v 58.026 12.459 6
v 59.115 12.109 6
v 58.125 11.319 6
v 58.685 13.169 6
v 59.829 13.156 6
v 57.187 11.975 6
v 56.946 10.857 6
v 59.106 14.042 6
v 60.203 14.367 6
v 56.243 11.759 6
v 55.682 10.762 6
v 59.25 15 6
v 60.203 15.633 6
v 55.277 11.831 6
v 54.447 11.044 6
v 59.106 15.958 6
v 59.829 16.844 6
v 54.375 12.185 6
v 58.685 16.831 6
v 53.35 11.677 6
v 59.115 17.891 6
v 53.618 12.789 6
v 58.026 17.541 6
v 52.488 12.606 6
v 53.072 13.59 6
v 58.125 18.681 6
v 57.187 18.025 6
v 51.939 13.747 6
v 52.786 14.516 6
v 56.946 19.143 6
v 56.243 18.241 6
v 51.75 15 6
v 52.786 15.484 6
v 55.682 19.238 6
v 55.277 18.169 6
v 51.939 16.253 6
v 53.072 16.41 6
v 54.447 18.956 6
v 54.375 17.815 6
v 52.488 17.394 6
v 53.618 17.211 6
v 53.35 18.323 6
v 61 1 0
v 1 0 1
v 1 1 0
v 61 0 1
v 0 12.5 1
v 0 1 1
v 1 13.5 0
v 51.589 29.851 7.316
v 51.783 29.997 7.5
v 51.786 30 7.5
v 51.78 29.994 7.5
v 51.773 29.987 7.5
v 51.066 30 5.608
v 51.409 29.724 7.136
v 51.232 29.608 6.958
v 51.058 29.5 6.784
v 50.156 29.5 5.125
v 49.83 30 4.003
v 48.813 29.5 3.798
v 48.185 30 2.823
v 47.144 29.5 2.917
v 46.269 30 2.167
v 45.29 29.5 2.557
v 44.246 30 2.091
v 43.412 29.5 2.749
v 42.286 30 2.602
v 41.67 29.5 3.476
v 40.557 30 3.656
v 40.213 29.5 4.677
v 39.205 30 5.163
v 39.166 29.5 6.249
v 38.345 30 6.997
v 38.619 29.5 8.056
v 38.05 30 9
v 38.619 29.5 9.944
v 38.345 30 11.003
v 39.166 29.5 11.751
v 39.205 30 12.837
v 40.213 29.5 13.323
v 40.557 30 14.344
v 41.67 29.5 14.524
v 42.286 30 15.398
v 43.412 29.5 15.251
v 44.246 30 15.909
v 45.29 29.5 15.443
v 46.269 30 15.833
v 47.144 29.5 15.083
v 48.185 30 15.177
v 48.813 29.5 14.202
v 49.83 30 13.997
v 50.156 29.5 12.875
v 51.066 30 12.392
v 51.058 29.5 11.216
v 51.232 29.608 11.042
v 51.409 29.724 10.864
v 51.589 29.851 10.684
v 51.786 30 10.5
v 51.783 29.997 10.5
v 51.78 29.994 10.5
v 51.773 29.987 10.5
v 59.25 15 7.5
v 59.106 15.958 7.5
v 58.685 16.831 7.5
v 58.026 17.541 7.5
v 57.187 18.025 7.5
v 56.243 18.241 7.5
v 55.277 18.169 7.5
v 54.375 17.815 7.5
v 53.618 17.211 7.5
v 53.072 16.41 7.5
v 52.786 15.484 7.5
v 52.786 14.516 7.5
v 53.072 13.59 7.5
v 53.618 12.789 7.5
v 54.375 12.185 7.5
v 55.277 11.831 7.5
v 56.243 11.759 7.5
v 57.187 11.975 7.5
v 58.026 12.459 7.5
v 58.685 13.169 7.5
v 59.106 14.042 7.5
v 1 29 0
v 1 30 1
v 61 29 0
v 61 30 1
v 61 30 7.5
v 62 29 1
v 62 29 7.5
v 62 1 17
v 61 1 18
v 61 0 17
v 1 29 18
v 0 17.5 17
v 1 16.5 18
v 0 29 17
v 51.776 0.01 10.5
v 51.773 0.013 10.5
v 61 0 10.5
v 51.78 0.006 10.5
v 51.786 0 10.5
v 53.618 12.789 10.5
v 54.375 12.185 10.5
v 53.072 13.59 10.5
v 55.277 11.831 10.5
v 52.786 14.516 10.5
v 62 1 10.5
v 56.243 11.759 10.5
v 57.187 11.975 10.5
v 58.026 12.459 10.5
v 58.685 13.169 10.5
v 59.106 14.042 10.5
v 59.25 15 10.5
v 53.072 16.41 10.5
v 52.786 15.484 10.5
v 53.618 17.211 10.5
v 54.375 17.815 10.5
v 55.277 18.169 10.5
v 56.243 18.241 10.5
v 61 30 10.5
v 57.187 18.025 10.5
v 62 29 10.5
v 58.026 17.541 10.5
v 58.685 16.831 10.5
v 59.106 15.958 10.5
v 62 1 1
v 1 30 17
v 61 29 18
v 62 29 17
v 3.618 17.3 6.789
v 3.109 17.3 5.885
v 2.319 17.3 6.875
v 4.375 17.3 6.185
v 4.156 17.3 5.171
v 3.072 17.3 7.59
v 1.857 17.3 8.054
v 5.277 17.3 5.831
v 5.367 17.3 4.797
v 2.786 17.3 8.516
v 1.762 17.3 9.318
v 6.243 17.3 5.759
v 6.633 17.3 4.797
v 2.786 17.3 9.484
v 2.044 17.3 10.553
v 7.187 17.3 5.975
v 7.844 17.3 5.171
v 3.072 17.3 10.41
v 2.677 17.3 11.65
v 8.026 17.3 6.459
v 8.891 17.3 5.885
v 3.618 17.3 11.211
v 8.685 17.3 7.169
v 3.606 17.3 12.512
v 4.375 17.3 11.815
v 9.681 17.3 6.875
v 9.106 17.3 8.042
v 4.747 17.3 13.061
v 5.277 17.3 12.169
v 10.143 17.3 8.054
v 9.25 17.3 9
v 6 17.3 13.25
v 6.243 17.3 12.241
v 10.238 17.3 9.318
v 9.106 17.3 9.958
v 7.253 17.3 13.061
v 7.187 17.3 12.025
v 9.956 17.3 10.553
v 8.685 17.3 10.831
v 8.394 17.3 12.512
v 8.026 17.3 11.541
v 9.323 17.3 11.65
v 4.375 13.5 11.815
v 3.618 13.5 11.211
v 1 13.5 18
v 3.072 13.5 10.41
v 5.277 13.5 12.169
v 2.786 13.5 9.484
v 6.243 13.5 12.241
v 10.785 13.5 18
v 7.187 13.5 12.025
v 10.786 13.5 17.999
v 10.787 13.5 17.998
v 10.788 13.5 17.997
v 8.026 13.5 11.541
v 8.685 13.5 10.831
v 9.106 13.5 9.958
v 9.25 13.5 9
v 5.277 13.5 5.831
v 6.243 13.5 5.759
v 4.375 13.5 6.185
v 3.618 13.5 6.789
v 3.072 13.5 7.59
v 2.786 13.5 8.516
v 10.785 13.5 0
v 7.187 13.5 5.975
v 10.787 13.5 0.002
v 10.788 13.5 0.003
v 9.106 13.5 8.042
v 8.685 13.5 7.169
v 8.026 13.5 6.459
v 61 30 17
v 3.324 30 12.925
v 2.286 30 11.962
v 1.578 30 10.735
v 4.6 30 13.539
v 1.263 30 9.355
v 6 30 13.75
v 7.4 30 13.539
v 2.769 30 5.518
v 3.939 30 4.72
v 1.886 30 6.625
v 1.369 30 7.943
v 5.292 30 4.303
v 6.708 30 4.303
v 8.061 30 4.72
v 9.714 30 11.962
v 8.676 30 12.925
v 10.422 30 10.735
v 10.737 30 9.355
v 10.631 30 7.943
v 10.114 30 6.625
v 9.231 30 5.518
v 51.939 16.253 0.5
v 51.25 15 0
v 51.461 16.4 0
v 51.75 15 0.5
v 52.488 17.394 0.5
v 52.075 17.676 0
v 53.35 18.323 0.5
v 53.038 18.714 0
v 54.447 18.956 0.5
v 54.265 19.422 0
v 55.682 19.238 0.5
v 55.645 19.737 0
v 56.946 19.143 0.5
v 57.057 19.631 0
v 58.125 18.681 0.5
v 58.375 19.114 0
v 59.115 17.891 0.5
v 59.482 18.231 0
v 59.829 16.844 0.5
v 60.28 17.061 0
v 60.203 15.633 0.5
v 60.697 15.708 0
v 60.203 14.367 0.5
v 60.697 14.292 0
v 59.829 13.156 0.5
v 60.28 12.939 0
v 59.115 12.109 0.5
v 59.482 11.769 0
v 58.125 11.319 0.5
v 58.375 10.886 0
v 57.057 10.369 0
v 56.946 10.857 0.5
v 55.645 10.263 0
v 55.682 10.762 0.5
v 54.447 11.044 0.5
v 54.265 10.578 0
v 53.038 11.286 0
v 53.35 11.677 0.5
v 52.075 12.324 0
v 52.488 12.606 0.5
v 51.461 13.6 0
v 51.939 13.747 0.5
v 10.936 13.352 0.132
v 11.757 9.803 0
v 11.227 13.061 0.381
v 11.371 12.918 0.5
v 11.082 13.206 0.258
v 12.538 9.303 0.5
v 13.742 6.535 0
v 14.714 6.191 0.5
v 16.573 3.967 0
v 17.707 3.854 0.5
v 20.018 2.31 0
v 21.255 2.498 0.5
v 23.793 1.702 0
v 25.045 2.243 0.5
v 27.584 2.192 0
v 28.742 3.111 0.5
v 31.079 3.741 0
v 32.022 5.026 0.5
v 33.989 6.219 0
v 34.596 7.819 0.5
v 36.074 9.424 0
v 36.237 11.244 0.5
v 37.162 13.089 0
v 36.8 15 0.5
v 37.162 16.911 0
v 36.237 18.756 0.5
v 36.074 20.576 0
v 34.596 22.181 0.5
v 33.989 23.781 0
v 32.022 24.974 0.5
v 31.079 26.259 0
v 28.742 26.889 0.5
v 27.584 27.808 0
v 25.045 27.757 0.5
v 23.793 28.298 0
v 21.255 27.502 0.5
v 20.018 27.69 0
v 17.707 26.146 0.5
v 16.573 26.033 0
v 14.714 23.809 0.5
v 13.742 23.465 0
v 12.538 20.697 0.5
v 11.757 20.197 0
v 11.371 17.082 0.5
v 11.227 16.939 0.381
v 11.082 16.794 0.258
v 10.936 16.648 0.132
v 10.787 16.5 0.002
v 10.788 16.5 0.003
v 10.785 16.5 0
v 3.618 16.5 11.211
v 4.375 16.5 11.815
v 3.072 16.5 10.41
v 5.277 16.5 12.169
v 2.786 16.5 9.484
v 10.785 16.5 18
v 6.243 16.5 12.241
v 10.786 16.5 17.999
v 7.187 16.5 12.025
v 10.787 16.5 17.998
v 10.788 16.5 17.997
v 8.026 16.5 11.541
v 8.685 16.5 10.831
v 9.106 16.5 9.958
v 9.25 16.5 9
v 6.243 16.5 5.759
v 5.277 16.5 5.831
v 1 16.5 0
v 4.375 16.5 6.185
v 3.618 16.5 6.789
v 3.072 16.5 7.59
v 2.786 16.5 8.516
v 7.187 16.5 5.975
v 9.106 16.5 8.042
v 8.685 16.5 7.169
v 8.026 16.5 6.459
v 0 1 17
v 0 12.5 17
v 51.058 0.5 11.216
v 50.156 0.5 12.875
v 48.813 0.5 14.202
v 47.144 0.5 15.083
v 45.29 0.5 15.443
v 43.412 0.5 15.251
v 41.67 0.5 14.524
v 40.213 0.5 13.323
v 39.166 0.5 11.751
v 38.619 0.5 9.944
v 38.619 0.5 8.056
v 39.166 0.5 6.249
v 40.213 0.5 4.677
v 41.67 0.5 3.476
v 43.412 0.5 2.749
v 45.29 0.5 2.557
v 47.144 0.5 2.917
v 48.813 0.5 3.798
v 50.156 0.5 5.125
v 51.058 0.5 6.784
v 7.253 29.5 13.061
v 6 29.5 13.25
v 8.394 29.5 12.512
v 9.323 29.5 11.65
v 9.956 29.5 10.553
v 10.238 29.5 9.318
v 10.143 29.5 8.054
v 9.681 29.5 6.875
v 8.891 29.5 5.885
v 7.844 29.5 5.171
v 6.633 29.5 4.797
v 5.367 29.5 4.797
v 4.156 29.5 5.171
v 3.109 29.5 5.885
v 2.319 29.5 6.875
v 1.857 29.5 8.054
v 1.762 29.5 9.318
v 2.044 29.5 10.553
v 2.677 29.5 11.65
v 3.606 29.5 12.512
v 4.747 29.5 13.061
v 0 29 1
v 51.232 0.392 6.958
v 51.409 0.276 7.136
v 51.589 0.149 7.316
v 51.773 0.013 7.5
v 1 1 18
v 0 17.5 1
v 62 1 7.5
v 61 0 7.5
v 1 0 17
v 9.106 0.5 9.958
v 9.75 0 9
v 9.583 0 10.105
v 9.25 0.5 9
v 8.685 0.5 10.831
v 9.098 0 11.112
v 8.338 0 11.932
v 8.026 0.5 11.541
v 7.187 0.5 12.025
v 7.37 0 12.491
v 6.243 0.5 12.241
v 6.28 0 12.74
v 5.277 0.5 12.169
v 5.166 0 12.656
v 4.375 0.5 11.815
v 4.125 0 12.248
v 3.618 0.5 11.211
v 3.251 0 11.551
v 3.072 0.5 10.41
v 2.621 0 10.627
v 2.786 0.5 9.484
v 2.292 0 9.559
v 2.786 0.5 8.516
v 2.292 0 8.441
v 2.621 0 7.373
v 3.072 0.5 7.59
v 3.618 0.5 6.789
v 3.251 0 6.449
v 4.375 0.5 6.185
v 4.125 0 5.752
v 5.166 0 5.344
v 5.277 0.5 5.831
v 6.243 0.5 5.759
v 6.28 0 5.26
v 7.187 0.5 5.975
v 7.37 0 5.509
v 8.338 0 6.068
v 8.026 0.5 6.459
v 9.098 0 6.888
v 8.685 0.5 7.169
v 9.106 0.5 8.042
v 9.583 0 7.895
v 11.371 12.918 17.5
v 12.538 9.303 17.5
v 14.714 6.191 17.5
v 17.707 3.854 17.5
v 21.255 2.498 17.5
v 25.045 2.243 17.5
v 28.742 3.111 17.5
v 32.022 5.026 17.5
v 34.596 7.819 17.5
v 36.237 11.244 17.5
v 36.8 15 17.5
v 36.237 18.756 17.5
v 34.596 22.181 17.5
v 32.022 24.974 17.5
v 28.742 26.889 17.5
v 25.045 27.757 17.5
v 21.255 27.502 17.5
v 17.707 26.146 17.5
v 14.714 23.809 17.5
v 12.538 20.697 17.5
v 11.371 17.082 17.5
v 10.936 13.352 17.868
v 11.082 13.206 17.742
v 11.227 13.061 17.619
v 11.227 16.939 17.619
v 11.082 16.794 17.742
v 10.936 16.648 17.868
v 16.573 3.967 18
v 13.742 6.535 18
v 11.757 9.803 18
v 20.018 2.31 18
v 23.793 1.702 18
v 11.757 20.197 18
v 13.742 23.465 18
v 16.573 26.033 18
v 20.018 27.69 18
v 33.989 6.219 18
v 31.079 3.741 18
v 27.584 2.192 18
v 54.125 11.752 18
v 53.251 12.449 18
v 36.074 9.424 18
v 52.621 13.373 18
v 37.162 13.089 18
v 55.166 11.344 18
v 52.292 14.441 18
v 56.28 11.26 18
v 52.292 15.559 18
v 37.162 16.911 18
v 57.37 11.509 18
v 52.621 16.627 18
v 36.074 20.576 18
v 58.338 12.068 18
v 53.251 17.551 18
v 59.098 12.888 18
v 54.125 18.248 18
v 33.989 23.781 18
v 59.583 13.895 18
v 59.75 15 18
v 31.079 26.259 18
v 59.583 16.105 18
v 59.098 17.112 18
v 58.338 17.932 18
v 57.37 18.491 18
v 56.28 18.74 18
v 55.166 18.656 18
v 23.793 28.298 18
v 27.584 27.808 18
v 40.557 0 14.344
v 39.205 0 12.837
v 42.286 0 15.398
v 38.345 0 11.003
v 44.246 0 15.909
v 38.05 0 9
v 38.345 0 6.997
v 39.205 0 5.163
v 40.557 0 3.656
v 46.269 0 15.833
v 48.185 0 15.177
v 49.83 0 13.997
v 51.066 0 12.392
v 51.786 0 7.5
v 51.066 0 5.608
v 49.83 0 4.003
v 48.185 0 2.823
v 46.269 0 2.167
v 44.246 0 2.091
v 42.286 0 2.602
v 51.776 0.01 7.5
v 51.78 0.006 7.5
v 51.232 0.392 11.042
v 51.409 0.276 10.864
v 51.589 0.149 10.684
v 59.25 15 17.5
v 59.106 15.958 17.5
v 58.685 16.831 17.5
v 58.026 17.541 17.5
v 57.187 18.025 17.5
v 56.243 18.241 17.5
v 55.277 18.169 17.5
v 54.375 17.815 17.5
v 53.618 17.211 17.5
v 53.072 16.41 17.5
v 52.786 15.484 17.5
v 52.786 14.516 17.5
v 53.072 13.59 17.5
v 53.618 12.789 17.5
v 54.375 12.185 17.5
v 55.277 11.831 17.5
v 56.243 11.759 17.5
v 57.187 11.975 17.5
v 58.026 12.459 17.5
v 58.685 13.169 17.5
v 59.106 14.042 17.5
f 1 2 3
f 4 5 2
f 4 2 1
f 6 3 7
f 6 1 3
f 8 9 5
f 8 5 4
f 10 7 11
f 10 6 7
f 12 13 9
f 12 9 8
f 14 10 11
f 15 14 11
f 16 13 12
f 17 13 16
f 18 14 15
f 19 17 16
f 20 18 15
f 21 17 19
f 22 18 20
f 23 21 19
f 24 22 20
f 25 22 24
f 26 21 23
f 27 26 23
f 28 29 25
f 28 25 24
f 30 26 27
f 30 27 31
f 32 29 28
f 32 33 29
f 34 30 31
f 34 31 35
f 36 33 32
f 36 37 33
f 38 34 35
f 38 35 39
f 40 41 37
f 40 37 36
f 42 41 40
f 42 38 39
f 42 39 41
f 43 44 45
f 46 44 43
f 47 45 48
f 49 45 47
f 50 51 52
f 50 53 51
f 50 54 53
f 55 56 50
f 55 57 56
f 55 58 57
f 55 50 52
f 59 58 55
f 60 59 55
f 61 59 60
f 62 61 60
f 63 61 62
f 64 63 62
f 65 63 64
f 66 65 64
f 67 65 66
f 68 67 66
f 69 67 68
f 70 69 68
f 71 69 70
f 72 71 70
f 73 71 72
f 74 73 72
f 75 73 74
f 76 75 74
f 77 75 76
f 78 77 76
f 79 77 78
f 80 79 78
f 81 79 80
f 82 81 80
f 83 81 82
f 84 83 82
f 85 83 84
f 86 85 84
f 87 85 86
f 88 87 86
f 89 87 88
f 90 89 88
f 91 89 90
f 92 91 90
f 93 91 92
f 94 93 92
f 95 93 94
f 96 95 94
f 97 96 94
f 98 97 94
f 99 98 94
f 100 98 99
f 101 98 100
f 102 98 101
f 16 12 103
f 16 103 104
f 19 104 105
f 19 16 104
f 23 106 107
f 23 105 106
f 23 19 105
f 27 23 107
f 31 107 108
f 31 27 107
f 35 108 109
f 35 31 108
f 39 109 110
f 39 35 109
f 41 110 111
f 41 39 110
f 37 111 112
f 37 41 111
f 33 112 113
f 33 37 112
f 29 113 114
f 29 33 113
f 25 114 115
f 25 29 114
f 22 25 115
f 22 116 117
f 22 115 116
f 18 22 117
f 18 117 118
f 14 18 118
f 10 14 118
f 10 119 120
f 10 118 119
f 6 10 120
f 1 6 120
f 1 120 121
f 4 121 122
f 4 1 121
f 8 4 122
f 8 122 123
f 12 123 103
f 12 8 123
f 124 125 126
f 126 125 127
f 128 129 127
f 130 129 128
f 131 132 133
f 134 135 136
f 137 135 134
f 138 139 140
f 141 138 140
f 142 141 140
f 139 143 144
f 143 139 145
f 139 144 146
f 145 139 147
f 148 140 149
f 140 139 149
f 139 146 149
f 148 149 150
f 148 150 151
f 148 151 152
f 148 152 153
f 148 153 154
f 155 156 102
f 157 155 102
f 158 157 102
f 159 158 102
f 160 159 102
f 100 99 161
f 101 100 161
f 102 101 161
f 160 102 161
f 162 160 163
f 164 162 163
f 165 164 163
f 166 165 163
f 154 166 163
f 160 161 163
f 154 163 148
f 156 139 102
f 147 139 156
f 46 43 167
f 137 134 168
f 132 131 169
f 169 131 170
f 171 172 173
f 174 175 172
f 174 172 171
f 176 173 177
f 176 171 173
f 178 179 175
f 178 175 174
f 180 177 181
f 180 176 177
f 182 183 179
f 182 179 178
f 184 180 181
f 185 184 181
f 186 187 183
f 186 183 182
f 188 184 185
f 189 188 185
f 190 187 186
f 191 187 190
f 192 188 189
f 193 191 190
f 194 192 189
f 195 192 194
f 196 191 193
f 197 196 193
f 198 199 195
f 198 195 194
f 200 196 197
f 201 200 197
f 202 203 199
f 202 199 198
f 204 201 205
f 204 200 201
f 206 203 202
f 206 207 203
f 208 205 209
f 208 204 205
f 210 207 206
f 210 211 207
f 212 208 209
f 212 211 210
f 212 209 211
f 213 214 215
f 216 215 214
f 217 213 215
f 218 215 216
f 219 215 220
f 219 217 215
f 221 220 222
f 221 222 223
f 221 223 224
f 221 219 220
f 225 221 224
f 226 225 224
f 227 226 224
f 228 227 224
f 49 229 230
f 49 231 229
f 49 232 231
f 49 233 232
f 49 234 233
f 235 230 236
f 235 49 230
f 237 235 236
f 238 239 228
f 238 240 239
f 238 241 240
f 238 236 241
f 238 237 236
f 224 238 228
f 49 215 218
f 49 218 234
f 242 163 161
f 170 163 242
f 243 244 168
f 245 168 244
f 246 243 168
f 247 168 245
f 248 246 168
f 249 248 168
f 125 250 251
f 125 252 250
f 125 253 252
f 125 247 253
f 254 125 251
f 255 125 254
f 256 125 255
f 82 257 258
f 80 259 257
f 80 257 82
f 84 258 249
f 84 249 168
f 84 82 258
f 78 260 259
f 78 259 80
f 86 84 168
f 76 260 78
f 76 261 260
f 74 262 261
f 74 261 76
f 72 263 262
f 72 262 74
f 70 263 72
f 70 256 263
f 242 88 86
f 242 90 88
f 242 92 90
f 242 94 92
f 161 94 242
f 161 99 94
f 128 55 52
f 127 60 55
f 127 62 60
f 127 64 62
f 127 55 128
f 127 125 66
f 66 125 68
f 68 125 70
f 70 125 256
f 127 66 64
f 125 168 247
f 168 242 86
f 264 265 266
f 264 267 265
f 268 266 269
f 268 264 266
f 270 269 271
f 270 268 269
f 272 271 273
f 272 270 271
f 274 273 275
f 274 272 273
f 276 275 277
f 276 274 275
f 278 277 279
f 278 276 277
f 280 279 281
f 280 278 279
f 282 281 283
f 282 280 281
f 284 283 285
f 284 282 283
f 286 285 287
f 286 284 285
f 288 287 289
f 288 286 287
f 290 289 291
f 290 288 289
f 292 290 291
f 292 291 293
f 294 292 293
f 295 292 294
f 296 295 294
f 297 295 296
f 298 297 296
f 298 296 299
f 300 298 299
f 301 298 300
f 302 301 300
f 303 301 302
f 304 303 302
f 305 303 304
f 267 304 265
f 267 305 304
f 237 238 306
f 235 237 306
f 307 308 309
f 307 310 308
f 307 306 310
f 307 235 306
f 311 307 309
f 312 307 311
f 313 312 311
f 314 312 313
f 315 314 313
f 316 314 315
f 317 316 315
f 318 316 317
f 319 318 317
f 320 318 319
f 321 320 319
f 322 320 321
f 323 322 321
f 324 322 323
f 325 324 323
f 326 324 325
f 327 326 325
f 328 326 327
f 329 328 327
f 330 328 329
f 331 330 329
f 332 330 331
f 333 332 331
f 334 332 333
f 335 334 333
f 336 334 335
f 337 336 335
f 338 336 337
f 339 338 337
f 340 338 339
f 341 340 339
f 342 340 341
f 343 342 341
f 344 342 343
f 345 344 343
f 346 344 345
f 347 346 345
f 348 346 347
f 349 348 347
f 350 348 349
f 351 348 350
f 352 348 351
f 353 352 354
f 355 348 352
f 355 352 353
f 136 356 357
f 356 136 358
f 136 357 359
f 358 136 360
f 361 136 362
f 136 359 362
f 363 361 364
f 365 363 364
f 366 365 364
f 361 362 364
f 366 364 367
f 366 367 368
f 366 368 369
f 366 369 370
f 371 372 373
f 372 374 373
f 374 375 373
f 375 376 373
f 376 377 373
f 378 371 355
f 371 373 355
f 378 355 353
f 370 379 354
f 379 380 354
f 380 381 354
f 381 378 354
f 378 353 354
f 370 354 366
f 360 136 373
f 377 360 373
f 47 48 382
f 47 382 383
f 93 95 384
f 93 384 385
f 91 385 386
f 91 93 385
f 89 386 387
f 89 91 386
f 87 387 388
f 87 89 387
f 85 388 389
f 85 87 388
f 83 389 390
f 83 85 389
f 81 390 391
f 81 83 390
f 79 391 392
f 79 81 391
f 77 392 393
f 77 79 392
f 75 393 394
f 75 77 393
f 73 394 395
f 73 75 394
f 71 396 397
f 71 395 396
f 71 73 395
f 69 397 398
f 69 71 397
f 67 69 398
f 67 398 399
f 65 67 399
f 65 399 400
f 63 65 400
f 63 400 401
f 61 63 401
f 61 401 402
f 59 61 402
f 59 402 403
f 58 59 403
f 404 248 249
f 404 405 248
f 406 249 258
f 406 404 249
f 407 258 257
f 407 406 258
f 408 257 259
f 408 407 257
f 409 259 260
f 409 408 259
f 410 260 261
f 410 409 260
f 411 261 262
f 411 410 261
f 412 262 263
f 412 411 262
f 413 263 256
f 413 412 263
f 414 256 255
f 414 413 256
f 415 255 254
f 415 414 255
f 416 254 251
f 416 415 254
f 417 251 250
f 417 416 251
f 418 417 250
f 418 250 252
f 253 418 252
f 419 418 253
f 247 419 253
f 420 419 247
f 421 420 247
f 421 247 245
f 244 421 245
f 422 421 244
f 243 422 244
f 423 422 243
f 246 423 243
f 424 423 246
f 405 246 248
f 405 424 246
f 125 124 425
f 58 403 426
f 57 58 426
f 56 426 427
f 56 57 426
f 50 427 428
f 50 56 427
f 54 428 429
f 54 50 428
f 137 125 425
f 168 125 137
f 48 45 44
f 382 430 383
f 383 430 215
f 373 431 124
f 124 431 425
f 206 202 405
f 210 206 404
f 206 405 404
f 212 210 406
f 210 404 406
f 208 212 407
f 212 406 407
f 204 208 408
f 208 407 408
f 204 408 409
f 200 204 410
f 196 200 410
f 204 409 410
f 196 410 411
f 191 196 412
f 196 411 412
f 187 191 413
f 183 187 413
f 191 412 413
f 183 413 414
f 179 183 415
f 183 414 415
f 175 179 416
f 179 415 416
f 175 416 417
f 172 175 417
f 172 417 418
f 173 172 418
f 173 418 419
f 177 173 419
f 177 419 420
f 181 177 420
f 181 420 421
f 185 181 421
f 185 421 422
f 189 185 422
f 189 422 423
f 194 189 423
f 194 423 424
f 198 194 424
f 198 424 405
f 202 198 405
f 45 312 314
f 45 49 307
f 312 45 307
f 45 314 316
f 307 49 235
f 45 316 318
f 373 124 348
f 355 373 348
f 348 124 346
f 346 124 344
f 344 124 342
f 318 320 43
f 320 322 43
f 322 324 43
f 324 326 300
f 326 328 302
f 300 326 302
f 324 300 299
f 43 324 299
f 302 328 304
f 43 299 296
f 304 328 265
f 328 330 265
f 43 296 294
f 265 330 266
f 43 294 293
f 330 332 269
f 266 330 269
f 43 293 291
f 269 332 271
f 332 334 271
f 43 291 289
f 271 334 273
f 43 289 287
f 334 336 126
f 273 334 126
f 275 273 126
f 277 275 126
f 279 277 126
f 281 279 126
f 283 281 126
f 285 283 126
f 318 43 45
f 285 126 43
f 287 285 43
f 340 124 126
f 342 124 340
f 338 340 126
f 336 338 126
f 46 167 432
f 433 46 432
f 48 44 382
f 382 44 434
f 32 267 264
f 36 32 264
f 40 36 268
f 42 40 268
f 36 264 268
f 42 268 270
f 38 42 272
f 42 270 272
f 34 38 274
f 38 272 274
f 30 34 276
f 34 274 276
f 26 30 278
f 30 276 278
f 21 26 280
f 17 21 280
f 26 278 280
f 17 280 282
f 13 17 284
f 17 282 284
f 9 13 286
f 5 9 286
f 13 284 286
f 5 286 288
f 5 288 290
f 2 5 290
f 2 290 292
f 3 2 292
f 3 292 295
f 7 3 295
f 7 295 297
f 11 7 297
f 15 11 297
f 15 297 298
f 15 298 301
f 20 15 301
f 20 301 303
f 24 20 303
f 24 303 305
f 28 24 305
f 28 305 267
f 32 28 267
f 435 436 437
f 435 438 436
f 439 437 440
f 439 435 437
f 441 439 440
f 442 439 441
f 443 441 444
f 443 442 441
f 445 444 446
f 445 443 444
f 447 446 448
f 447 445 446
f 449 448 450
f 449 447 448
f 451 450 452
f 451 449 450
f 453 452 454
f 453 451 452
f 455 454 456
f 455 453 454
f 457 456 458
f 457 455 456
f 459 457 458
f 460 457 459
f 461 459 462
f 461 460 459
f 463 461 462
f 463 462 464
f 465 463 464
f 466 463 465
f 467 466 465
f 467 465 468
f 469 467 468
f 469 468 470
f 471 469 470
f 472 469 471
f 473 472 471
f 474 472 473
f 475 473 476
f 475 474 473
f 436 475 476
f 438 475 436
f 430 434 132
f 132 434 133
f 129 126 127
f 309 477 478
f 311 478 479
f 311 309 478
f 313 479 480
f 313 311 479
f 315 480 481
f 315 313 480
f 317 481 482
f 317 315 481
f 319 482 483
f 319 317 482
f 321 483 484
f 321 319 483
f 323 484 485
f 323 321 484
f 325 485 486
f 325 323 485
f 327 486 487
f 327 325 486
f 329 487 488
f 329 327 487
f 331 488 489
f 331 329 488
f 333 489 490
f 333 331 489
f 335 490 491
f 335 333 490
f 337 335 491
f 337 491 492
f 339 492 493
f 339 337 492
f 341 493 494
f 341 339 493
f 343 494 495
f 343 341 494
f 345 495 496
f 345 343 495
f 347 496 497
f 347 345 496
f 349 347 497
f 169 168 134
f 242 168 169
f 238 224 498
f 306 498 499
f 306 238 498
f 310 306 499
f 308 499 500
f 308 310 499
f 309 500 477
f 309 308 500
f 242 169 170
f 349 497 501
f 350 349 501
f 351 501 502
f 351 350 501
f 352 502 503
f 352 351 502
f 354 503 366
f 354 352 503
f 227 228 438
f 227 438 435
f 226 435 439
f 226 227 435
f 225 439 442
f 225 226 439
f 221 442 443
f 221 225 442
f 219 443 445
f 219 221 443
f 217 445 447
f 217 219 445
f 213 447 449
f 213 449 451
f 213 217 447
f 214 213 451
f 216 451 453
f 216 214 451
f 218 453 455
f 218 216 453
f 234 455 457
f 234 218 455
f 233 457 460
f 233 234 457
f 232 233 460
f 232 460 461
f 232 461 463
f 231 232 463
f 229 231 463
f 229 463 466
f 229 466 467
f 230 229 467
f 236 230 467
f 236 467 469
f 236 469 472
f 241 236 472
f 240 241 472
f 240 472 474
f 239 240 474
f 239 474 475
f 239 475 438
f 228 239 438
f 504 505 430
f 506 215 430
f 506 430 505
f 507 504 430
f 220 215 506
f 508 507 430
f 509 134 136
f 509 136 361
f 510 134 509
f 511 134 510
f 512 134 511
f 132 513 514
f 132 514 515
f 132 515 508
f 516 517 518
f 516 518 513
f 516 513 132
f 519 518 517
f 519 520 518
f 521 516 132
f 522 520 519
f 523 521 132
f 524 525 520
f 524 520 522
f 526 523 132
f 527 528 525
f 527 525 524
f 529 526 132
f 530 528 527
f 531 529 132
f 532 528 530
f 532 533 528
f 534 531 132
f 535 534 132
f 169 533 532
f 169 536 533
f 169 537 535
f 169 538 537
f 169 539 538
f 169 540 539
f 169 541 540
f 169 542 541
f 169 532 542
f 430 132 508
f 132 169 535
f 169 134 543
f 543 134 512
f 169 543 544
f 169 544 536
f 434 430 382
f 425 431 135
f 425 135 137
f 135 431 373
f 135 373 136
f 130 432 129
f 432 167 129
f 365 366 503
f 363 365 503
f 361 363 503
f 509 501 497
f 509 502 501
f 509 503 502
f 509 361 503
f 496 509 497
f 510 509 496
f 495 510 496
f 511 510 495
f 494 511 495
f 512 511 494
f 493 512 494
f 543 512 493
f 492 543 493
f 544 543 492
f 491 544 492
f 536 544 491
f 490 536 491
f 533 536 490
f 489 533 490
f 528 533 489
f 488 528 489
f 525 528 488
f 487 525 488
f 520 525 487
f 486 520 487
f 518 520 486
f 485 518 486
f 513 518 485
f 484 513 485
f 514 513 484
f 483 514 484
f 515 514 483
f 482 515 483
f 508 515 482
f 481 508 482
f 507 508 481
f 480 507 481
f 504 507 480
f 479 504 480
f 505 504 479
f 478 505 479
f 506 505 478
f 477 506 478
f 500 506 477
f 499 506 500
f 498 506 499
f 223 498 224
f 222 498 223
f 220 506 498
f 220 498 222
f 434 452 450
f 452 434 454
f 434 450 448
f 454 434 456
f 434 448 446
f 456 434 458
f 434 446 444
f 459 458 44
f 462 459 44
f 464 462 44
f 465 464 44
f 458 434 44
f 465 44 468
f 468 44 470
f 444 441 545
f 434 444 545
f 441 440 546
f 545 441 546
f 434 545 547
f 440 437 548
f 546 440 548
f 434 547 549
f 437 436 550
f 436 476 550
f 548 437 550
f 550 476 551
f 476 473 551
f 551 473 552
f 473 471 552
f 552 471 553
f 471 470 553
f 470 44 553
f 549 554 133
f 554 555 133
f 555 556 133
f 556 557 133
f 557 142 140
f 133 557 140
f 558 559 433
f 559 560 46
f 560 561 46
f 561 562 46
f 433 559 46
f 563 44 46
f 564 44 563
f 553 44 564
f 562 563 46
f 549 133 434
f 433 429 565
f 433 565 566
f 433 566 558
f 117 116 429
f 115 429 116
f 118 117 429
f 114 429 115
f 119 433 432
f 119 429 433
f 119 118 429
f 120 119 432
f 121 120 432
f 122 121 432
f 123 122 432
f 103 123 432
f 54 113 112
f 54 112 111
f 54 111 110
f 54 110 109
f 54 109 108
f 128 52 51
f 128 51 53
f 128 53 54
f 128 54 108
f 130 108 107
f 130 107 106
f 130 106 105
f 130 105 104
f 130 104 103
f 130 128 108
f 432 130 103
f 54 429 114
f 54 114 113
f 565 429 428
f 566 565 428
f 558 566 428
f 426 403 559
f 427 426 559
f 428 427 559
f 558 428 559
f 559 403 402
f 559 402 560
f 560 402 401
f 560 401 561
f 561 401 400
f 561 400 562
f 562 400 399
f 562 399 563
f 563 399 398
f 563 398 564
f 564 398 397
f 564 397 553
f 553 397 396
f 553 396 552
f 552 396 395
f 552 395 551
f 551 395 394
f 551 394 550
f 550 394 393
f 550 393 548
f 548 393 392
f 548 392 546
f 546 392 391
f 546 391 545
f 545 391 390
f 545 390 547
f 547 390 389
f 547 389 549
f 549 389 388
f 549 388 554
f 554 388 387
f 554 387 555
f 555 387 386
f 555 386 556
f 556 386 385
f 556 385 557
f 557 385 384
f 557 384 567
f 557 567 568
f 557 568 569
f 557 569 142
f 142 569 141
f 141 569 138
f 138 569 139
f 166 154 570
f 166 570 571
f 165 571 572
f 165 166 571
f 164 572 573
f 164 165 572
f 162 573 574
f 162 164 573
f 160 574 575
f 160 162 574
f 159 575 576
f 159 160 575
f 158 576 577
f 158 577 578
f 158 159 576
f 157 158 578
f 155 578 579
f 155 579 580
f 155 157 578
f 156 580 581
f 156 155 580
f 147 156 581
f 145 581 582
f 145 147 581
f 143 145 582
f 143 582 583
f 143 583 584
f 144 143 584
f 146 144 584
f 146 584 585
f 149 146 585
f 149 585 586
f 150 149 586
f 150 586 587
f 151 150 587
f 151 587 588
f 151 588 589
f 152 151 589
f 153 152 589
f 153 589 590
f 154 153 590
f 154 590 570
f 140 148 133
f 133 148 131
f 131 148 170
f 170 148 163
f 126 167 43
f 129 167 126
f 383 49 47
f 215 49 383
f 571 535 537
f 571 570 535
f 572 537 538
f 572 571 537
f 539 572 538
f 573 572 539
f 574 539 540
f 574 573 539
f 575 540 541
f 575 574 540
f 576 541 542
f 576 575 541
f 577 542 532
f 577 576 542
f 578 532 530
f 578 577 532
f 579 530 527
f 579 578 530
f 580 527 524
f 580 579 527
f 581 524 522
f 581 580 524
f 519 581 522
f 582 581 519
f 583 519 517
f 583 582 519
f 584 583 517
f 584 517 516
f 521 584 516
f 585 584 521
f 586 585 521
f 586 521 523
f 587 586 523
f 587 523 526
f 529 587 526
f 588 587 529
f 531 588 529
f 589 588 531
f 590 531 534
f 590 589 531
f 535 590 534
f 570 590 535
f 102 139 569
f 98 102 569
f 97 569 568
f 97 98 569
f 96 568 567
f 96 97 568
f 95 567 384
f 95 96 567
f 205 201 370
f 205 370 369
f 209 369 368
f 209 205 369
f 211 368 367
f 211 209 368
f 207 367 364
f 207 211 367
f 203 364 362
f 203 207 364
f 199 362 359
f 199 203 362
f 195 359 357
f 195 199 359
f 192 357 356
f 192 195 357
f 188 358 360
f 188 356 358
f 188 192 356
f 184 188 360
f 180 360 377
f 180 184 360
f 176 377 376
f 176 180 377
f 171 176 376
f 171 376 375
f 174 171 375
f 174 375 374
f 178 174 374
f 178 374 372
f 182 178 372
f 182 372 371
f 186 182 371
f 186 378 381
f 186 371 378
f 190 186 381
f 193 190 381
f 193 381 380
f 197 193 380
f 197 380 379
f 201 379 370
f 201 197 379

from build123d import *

# Parameters (mm, degrees)
ESQUISSE1_W                  = 62
ESQUISSE1_H                  = 30
BOSS_EXTRU_1_DEPTH           = 18
ENL_V_MAT_EXTRU_1_DEPTH      = 72.189886922
ENL_V_MAT_EXTRU_1_DEPTH_BACK = 72.189886922
ESQUISSE2_R                  = 12.8
ENL_V_MAT_EXTRU_2_DEPTH      = 72.189886922
ENL_V_MAT_EXTRU_2_DEPTH_BACK = 72.189886922
ESQUISSE3_W                  = 15
ESQUISSE3_H                  = 3
ENL_V_MAT_EXTRU_3_DEPTH      = 72.189886922
ENL_V_MAT_EXTRU_3_DEPTH_BACK = 72.189886922
ESQUISSE4_R                  = 6.45
ESQUISSE4_R_2                = 3.25
ENL_V_MAT_EXTRU_4_DEPTH      = 72.189886922
ENL_V_MAT_EXTRU_4_DEPTH_BACK = 72.189886922
ESQUISSE6_W                  = 15
ESQUISSE6_H                  = 3
ENL_V_MAT_EXTRU_5_DEPTH      = 72.189886922
ENL_V_MAT_EXTRU_5_DEPTH_BACK = 72.189886922
ESQUISSE8_R                  = 3.25
ESQUISSE9_R                  = 4.25
ENL_V_MAT_EXTRU_6_DEPTH      = 12.7
ESQUISSE10_R                 = 4.25
ENL_V_MAT_EXTRU_7_DEPTH      = 6
CHANFREIN1_SIZE              = 0.5
CHANFREIN2_SIZE              = 1


with BuildPart() as part:
    # Esquisse1 → Boss.-Extru.1 (new body)
    with BuildSketch(Plane.XY):
        with Locations((31, 15)):
            Rectangle(ESQUISSE1_W, ESQUISSE1_H)
    extrude(amount=BOSS_EXTRU_1_DEPTH)

    # Esquisse2 → Enlèv. mat.-Extru.1 (cut, two sides: drawn at the far end of the back side and taken through both)
    with BuildSketch(Plane.XY.offset(18).offset(-ENL_V_MAT_EXTRU_1_DEPTH_BACK)):
        with Locations((24, 15)):
            Circle(ESQUISSE2_R)
    extrude(amount=ENL_V_MAT_EXTRU_1_DEPTH + ENL_V_MAT_EXTRU_1_DEPTH_BACK, mode=Mode.SUBTRACT)

    # Esquisse3 → Enlèv. mat.-Extru.2 (cut, two sides: drawn at the far end of the back side and taken through both)
    with BuildSketch(Plane.XY.offset(18).offset(-ENL_V_MAT_EXTRU_2_DEPTH_BACK)):
        with Locations((7.5, 15)):
            Rectangle(ESQUISSE3_W, ESQUISSE3_H)
    extrude(amount=ENL_V_MAT_EXTRU_2_DEPTH + ENL_V_MAT_EXTRU_2_DEPTH_BACK, mode=Mode.SUBTRACT)

    # Esquisse4 → Enlèv. mat.-Extru.3 (cut, two sides: drawn at the far end of the back side and taken through both)
    with BuildSketch(Plane.XZ.offset(-ENL_V_MAT_EXTRU_3_DEPTH_BACK)):
        with Locations(Location((45, 9, 0), (0, 0, 270))):
            Circle(ESQUISSE4_R)
        with Locations((6, 9)):
            Circle(ESQUISSE4_R_2)
    extrude(amount=ENL_V_MAT_EXTRU_3_DEPTH + ENL_V_MAT_EXTRU_3_DEPTH_BACK, mode=Mode.SUBTRACT)

    # Esquisse6 → Enlèv. mat.-Extru.4 (cut, two sides: drawn at the far end of the back side and taken through both)
    with BuildSketch(Plane.XZ.offset(-ENL_V_MAT_EXTRU_4_DEPTH_BACK)):
        with Locations((54.5, 9)):
            Rectangle(ESQUISSE6_W, ESQUISSE6_H)
    extrude(amount=ENL_V_MAT_EXTRU_4_DEPTH + ENL_V_MAT_EXTRU_4_DEPTH_BACK, mode=Mode.SUBTRACT)

    # Esquisse8 → Enlèv. mat.-Extru.5 (cut, two sides: drawn at the far end of the back side and taken through both)
    with BuildSketch(Plane.XY.offset(18).offset(-ENL_V_MAT_EXTRU_5_DEPTH_BACK)):
        with Locations((56, 15)):
            Circle(ESQUISSE8_R)
    extrude(amount=ENL_V_MAT_EXTRU_5_DEPTH + ENL_V_MAT_EXTRU_5_DEPTH_BACK, mode=Mode.SUBTRACT)

    # Esquisse9 → Enlèv. mat.-Extru.6 (cut)
    with BuildSketch(Plane(origin=(0, 30, 0), x_dir=(1, 0, 0), z_dir=(0, 1, 0))):
        with Locations(Location((6, -9, 0), (0, 0, 270))):
            Circle(ESQUISSE9_R)
    extrude(amount=-ENL_V_MAT_EXTRU_6_DEPTH, mode=Mode.SUBTRACT)

    # Esquisse10 → Enlèv. mat.-Extru.7 (cut)
    with BuildSketch(Plane(origin=(0, 0, 0), x_dir=(-1, 0, 0), z_dir=(0, 0, -1))):
        with Locations((-56, 15)):
            Circle(ESQUISSE10_R)
    extrude(amount=-ENL_V_MAT_EXTRU_7_DEPTH, mode=Mode.SUBTRACT)

    # Chanfrein1
    # the kernel refuses this chamfer: 0.675653437, 0.570826882, 0.5 mm, written as the material it takes off along each edge
    with BuildSketch(Plane(origin=(6, 0, 9), x_dir=(1, 0, 0), z_dir=(0, 0, -1))) as chanfrein1_piece_1:
        Polygon((3.25 + CHANFREIN1_SIZE, 0), (3.25, -CHANFREIN1_SIZE), (3.25, 0), align=None)
    revolve(axis=Axis((6, 0, 9), (0, -1, 0)), mode=Mode.SUBTRACT)
    with BuildSketch(Plane(origin=(56, 15, 18), x_dir=(1, 0, 0), z_dir=(0, -1, 0))) as chanfrein1_piece_2:
        Polygon((3.25 + CHANFREIN1_SIZE, 0), (3.25, -CHANFREIN1_SIZE), (3.25, 0), align=None)
    revolve(axis=Axis((56, 15, 18), (0, 0, 1)), mode=Mode.SUBTRACT)
    with BuildSketch(Plane(origin=(6, 30, 9), x_dir=(0, 0, 1), z_dir=(-1, 0, 0))) as chanfrein1_piece_3:
        Polygon((4.25 + CHANFREIN1_SIZE, 0), (4.25, -CHANFREIN1_SIZE), (4.25, 0), align=None)
    revolve(axis=Axis((6, 30, 9), (0, 1, 0)), mode=Mode.SUBTRACT)
    with BuildSketch(Plane(origin=(56, 15, 0), x_dir=(-1, 0, 0), z_dir=(0, -1, 0))) as chanfrein1_piece_4:
        Polygon((4.25 + CHANFREIN1_SIZE, 0), (4.25, -CHANFREIN1_SIZE), (4.25, 0), align=None)
    revolve(axis=Axis((56, 15, 0), (0, 0, -1)), mode=Mode.SUBTRACT)
    with BuildSketch(Plane(origin=(11.288194463, 16.5, -1.516273716), x_dir=(0.1399712439743316, 0.990155569019474, 0), z_dir=(0, 0, 1))) as chanfrein1_piece_5:
        with BuildLine():
            Line((0.588107761, 0), (-CHANFREIN1_SIZE * 0.139971243974, CHANFREIN1_SIZE * 0.990155569019))
            Line((-CHANFREIN1_SIZE * 0.139971243974, CHANFREIN1_SIZE * 0.990155569019), (0, 0))
            ThreePointArc((0, 0), (0.303184371, 0.003374833), (0.588107761, 0))
        make_face()
    extrude(amount=21.032547433, mode=Mode.SUBTRACT)
    with BuildSketch(Plane(origin=(11.288194463, 13.5, -1.516273716), x_dir=(-1, 0, 0), z_dir=(0, 0, 1))) as chanfrein1_piece_6:
        with BuildLine():
            Line((CHANFREIN1_SIZE, 0), (-0.082318175, 0.582318175))
            ThreePointArc((-0.082318175, 0.582318175), (-0.039095484, 0.300672073), (0, 0))
            Line((0, 0), (CHANFREIN1_SIZE, 0))
        make_face()
    extrude(amount=21.032547433, mode=Mode.SUBTRACT)
    with BuildSketch(Plane(origin=(51.2731571, 31.928380981, 10.5), x_dir=(1, 0, 0), z_dir=(0, -1, 0))) as chanfrein1_piece_7:
        with BuildLine():
            Line((CHANFREIN1_SIZE, 0), (-0.215649634, 0.715649634))
            ThreePointArc((-0.215649634, 0.715649634), (-0.100904588, 0.372377882), (0, 0))
            Line((0, 0), (CHANFREIN1_SIZE, 0))
        make_face()
    extrude(amount=33.856761963, mode=Mode.SUBTRACT)
    with BuildSketch(Plane(origin=(51.2731571, 31.928380981, 7.5), x_dir=(-0.28851956060345535, 0, -0.9574740012915176), z_dir=(0, -1, 0))) as chanfrein1_piece_8:
        with BuildLine():
            Line((0.747435056, 0), (-CHANFREIN1_SIZE * 0.288519560603, CHANFREIN1_SIZE * 0.957474001292))
            Line((-CHANFREIN1_SIZE * 0.288519560603, CHANFREIN1_SIZE * 0.957474001292), (0, 0))
            ThreePointArc((0, 0), (0.385655089, 0.010824783), (0.747435056, 0))
        make_face()
    extrude(amount=33.856761963, mode=Mode.SUBTRACT)
    # the kernel refuses this chamfer: 0.675653437, 0.570826882, 0.5 mm, written as the material it takes off along each edge
    with BuildSketch(Plane(origin=(24, 15, 18), x_dir=(-0.9980557123023516, 0.06232812479648115, 0), z_dir=(-0.06232812479648115, -0.9980557123023516, 0))) as chanfrein1_2_piece_1:
        Polygon((12.8, CHANFREIN1_SIZE), (12.8 + CHANFREIN1_SIZE, 0), (12.8, 0), align=None)
    revolve(axis=Axis((24, 15, 18), (0, 0, -1)), revolution_arc=352.853090525, mode=Mode.SUBTRACT)
    with BuildSketch(Plane(origin=(24, 15, 0), x_dir=(-0.9980557123023512, -0.06232812479648351, 0), z_dir=(-0.06232812479648351, 0.9980557123023512, 0))) as chanfrein1_2_piece_2:
        Polygon((12.8, CHANFREIN1_SIZE), (12.8 + CHANFREIN1_SIZE, 0), (12.8, 0), align=None)
    revolve(axis=Axis((24, 15, 0), (0, 0, 1)), revolution_arc=352.853090525, mode=Mode.SUBTRACT)
    with BuildSketch(Plane(origin=(45, 30, 9), x_dir=(0.9887286551586735, 0, -0.14971855752751953), z_dir=(0.14971855752751953, 0, 0.9887286551586735))) as chanfrein1_2_piece_3:
        Polygon((6.45 + CHANFREIN1_SIZE, 0), (6.45, -CHANFREIN1_SIZE), (6.45, 0), align=None)
    revolve(axis=Axis((45, 30, 9), (0, 1, 0)), revolution_arc=342.778766173, mode=Mode.SUBTRACT)
    with BuildSketch(Plane(origin=(45, 0, 9), x_dir=(0.9887286551586734, 0, -0.14971855752752006), z_dir=(0.14971855752752006, 0, 0.9887286551586734))) as chanfrein1_2_piece_4:
        Polygon((6.45 + CHANFREIN1_SIZE, 0), (6.45, CHANFREIN1_SIZE), (6.45, 0), align=None)
    revolve(axis=Axis((45, 0, 9), (0, 1, 0)), revolution_arc=342.778766173, mode=Mode.SUBTRACT)

    # Chanfrein2
    chanfrein2_edges = [part.edges().sort_by_distance(p)[0] for p in [
        (62, 15, 18),
        (31, 30, 18),
        (0, 6.75, 0),
        (0, 6.75, 18),
        (0, 13.5, 9),
        (0, 16.5, 9),
        (0, 23.25, 18),
        (31, 30, 0),
        (62, 15, 0),
        (31, 0, 0),
        (62, 30, 3.75),
        (0, 23.25, 0),
        (62, 0, 3.75),
        (31, 0, 18),
        (0, 30, 9),
        (62, 30, 14.25),
        (62, 0, 14.25),
        (0, 0, 9),
    ]]
    chamfer(chanfrein2_edges, length=CHANFREIN2_SIZE)


solid = part.part
